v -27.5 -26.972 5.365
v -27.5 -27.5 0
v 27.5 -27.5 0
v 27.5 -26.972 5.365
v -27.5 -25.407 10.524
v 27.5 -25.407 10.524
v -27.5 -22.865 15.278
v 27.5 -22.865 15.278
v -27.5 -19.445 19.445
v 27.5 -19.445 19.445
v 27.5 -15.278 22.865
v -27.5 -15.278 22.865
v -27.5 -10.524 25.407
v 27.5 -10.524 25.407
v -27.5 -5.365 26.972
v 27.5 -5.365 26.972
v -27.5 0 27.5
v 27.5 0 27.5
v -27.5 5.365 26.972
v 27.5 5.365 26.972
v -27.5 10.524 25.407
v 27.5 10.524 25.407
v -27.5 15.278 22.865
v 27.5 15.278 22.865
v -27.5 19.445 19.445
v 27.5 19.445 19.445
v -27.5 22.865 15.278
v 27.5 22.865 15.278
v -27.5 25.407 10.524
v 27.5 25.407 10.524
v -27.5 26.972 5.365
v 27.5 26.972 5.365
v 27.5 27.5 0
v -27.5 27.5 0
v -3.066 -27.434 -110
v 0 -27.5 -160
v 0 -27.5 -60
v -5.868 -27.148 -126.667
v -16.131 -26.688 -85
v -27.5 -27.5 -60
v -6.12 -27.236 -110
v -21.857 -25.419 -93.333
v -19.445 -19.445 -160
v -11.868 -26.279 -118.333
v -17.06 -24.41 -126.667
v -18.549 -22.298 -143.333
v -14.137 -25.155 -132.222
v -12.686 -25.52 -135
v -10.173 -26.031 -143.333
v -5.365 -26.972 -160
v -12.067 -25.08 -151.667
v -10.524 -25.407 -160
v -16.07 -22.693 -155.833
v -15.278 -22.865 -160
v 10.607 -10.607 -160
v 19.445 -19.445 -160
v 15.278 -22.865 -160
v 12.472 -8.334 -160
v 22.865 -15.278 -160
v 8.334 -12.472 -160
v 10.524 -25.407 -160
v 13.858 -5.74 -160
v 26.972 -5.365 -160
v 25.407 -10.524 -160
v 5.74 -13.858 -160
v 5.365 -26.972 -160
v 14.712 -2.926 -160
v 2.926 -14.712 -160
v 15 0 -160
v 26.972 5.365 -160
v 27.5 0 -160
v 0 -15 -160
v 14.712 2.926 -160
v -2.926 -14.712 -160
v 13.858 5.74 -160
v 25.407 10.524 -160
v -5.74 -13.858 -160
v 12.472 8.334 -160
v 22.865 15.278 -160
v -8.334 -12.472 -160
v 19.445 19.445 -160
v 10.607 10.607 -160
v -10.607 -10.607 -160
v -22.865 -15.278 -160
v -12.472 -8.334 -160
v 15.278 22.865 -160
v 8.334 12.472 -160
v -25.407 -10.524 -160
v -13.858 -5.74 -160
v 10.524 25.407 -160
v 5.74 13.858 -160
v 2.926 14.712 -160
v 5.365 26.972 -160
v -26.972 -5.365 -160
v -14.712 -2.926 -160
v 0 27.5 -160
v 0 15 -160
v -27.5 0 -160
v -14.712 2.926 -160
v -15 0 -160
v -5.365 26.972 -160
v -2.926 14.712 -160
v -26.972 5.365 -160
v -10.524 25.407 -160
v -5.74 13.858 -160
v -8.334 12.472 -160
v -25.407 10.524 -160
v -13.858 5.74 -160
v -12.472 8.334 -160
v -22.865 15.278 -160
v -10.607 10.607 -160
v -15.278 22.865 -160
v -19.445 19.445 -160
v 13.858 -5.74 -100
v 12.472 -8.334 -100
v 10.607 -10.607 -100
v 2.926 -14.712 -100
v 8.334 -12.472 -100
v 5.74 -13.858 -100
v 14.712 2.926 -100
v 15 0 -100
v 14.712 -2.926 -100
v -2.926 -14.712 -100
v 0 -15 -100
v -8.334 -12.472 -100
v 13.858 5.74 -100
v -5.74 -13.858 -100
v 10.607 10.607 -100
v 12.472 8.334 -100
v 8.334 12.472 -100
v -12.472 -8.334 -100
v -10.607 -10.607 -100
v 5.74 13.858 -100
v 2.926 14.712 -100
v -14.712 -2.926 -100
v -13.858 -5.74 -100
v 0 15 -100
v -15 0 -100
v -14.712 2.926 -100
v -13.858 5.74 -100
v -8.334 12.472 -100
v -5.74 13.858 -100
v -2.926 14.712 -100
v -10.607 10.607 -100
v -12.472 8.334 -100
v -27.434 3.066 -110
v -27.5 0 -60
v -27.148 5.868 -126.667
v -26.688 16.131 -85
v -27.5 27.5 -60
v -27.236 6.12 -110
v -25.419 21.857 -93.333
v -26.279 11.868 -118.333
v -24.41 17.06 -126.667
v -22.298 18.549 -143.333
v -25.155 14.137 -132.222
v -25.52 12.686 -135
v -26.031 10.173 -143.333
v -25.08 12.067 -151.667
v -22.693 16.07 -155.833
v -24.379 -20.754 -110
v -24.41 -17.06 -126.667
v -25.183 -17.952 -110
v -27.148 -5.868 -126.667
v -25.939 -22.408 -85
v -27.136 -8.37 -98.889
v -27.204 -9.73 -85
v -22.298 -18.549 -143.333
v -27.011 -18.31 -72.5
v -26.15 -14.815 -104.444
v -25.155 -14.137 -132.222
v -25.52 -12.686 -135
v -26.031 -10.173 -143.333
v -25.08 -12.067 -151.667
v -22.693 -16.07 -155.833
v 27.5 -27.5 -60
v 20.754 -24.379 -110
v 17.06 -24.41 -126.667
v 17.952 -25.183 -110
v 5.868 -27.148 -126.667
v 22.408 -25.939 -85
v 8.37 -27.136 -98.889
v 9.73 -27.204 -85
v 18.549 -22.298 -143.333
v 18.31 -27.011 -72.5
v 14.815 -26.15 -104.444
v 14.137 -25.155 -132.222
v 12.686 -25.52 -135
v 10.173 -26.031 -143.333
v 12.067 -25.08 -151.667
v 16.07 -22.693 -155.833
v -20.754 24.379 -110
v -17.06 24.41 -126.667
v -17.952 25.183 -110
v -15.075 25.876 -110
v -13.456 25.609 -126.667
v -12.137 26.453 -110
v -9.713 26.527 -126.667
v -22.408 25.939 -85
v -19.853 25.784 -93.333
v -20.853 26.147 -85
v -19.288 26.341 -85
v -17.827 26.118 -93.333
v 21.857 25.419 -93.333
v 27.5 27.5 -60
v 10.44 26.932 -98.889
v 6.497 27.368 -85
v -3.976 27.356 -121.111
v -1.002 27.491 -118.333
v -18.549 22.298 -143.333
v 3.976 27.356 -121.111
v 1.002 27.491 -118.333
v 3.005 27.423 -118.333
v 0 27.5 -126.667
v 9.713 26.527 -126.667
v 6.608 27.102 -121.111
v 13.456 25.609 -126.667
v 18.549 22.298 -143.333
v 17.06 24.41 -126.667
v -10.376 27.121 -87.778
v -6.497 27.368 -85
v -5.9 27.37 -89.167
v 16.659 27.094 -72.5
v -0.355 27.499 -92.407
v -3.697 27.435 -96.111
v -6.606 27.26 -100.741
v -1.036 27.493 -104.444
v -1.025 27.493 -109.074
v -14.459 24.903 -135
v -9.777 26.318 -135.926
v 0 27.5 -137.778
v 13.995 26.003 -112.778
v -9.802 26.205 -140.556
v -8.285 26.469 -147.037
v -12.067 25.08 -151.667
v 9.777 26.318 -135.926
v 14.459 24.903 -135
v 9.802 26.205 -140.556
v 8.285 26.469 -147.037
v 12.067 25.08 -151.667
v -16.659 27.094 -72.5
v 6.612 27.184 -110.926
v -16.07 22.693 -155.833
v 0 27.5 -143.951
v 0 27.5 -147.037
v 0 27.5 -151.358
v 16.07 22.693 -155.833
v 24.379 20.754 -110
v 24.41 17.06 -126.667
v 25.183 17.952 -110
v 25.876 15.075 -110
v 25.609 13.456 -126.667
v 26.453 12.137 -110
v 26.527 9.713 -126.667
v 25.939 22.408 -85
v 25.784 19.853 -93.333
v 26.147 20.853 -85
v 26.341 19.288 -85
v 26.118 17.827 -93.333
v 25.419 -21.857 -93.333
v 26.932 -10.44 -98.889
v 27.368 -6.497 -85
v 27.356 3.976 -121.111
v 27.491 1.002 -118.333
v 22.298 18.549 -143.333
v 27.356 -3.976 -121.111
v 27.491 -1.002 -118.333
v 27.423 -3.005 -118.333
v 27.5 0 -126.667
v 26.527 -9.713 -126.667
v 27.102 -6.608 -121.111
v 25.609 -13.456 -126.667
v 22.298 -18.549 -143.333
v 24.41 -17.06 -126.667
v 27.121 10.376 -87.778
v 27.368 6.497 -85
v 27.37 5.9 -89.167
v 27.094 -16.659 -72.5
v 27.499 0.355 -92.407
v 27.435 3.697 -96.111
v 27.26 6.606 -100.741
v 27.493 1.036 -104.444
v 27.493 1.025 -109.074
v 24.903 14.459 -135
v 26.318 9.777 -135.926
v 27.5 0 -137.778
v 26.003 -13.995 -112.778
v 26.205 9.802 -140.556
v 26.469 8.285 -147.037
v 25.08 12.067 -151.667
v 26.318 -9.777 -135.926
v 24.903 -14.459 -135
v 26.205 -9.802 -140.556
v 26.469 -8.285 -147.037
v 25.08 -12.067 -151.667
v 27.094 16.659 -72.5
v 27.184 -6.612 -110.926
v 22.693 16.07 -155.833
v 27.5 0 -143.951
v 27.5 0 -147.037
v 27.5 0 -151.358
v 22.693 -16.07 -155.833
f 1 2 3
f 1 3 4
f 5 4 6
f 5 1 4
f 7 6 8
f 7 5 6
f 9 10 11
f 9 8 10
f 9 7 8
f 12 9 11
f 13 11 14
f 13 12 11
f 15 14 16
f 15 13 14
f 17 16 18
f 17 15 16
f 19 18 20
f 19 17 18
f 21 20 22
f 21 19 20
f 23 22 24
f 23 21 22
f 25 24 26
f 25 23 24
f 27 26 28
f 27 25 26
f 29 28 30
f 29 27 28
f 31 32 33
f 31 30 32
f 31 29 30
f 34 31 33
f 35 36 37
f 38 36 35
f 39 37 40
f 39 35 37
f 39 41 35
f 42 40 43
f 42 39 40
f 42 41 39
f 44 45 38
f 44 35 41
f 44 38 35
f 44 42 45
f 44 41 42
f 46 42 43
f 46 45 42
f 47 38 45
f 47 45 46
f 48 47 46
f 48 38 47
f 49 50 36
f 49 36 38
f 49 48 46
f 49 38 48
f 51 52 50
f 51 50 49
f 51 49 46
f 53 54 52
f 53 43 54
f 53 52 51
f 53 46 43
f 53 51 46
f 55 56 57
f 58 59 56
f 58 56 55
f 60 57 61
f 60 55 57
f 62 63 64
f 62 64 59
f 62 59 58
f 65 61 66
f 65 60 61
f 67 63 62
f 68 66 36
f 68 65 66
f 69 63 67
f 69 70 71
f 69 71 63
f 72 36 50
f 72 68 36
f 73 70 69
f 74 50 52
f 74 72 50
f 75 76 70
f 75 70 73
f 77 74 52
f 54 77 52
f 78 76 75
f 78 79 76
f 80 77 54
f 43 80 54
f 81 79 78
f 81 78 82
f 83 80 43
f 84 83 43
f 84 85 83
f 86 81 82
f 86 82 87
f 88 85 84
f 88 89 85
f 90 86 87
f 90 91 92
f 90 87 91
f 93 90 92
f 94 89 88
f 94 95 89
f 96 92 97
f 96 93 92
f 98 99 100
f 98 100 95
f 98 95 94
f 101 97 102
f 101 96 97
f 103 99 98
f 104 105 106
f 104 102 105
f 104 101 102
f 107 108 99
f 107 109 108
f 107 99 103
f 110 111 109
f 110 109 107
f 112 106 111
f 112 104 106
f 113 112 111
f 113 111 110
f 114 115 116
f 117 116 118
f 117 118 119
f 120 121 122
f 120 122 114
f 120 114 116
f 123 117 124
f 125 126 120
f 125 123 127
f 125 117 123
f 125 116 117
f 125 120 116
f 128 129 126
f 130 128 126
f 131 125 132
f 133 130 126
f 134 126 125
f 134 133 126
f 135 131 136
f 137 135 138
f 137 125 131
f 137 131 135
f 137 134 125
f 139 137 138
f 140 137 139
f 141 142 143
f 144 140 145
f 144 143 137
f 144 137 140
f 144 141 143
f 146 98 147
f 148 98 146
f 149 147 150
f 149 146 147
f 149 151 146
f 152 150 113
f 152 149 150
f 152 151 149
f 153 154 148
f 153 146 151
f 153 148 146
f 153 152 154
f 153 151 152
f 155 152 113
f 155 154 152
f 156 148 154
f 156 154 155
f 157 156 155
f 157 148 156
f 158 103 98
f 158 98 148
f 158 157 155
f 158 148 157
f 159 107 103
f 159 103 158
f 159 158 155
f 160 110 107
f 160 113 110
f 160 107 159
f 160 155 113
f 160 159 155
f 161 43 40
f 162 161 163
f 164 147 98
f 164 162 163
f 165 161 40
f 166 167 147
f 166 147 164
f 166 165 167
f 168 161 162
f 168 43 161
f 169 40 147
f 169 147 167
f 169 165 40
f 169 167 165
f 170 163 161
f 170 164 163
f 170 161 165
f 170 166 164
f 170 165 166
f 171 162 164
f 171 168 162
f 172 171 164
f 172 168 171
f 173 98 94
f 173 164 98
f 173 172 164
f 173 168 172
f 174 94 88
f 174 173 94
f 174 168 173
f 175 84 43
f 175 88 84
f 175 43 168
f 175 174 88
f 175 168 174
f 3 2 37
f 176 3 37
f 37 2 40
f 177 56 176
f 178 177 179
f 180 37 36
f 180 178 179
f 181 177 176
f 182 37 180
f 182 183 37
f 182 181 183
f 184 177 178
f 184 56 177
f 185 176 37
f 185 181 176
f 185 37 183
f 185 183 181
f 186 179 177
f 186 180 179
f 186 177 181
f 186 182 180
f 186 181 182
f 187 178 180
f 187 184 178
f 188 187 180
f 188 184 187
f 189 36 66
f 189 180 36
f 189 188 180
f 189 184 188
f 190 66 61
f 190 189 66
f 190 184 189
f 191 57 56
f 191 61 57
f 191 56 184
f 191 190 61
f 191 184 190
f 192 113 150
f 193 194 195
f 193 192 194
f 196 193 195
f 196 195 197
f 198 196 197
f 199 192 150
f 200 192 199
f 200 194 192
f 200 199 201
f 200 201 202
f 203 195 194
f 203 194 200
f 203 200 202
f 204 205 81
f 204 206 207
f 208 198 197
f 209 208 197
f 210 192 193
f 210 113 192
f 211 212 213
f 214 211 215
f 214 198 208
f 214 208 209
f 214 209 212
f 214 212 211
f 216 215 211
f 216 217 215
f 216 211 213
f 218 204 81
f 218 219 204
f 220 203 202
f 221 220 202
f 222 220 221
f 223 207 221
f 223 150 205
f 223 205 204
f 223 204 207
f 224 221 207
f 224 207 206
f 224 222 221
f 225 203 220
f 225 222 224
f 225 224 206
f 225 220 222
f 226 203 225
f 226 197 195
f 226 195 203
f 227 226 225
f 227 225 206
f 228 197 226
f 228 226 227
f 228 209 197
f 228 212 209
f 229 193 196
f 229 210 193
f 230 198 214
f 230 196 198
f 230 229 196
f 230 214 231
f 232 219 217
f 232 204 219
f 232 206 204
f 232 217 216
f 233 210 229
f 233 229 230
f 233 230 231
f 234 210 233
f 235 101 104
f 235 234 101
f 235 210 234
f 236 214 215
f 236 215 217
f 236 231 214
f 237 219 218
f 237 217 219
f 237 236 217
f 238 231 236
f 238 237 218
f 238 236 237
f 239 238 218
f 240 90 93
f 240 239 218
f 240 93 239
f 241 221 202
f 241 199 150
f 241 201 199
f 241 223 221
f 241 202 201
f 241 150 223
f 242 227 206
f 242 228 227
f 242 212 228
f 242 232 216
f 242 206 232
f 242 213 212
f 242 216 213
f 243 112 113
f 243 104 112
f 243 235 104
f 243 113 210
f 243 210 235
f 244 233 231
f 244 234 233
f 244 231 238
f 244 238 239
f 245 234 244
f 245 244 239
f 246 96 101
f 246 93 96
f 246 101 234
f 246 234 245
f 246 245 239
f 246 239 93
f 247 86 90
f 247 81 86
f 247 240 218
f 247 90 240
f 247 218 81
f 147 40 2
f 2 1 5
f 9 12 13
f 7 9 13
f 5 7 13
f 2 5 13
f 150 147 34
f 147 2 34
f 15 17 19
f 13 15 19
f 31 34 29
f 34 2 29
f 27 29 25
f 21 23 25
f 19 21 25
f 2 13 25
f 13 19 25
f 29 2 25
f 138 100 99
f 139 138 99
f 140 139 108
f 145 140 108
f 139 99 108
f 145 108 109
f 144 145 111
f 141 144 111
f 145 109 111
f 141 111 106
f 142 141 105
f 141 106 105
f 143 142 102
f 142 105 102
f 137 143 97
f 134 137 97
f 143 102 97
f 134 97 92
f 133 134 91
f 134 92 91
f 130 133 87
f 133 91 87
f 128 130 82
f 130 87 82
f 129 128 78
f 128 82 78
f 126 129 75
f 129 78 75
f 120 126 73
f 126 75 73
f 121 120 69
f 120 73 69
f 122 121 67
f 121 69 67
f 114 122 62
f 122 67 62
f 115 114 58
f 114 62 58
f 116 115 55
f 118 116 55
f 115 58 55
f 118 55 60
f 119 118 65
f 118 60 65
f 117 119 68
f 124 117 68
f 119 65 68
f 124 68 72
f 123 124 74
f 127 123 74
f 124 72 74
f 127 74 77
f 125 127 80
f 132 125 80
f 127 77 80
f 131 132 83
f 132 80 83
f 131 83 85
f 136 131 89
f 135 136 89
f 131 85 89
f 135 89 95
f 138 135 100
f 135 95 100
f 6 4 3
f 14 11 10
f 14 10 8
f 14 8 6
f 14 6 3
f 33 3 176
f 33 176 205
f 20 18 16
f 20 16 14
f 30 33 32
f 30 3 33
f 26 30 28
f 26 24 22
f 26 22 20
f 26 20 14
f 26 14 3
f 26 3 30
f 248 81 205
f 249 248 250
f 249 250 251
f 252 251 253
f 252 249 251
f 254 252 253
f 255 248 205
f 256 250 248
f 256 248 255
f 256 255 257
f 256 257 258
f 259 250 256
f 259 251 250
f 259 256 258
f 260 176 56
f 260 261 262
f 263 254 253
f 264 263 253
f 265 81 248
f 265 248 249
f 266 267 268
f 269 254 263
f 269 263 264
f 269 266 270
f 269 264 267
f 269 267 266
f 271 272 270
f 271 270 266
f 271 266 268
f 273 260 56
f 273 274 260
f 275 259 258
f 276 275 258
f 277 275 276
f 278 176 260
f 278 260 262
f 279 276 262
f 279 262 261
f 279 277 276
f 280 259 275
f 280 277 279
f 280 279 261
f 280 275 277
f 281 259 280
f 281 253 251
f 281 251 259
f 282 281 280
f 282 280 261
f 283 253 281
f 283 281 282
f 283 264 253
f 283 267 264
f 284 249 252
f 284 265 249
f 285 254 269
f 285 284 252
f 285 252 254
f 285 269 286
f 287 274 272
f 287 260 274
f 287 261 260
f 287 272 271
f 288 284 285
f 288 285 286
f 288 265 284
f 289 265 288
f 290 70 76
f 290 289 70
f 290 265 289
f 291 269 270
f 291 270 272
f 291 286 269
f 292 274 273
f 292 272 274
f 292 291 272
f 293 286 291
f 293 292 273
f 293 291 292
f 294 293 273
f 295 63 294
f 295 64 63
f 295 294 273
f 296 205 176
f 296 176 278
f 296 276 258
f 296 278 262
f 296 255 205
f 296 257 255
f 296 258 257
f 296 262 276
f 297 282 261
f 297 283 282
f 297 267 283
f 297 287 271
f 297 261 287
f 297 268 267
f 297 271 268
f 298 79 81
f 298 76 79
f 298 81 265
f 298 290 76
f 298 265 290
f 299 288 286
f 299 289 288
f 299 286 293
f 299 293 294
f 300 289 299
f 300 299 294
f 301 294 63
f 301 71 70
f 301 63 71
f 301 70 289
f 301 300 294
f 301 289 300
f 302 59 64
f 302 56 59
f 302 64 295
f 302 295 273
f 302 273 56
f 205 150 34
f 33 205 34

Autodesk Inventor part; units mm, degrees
ref_plane "YZ Plane" through (0, 0, 0) normal (1, 0, 0) x (0, 1, 0)
ref_plane "XZ Plane" through (0, 0, 0) normal (0, 1, 0) x (-1, 0, 0)
sketch "Sketch1" plane through (0, 0, 0) normal (1, 0, 0) x (0, 1, 0)
  circle A0 centre (0, 0) radius 27.5
  line L0 (-27.5, 0) -> (-27.5, -60)
  line L1 (-27.5, -60) -> (27.5, -60)
  line L2 (27.5, -60) -> (27.5, 0)
  dimension "d0" = 55
  dimension "d1" = 60
extrude "Extrusion1" add sketch "Sketch1" along normal mid plane 55
sketch "Sketch2" plane through (27.5, 27.5, -60) normal (0, 0, -1) x (-1, 0, 0)
  line L0 (0, -55) -> (0, 0) projected
  line L1 (55, 0) -> (0, 0)
  line L2 (0, 0) -> (0, -55)
  line L3 (0, -55) -> (55, -55)
  line L4 (55, -55) -> (55, 0)
  line L5 (55, 0) -> (0, -55) construction
  line L6 (0, 0) -> (55, -55) construction
  point P0 (27.5, -27.5)
ref_plane "Work Plane1" through (27.5, 27.5, -160) normal (0, 0, -1) x (-1, 0, 0)
sketch "Sketch3" plane through (27.5, 27.5, -160) normal (0, 0, -1) x (-1, 0, 0)
  circle A0 centre (27.5, -27.5) radius 27.5
  line L0 (55, -55) -> (0, -55) projected
  point P0 (27.5, -27.5)
loft "Loft1" add profiles "Sketch2", "Sketch3"
sketch "Sketch4" plane through (27.5, 27.5, -160) normal (0, 0, -1) x (-1, 0, 0)
  circle A0 centre (27.5, -27.5) radius 15
  point P0 (27.5, -27.5)
  dimension "d9" = 30
extrude "Extrusion2" cut sketch "Sketch4" against normal blind 60
properties part number "shank"
